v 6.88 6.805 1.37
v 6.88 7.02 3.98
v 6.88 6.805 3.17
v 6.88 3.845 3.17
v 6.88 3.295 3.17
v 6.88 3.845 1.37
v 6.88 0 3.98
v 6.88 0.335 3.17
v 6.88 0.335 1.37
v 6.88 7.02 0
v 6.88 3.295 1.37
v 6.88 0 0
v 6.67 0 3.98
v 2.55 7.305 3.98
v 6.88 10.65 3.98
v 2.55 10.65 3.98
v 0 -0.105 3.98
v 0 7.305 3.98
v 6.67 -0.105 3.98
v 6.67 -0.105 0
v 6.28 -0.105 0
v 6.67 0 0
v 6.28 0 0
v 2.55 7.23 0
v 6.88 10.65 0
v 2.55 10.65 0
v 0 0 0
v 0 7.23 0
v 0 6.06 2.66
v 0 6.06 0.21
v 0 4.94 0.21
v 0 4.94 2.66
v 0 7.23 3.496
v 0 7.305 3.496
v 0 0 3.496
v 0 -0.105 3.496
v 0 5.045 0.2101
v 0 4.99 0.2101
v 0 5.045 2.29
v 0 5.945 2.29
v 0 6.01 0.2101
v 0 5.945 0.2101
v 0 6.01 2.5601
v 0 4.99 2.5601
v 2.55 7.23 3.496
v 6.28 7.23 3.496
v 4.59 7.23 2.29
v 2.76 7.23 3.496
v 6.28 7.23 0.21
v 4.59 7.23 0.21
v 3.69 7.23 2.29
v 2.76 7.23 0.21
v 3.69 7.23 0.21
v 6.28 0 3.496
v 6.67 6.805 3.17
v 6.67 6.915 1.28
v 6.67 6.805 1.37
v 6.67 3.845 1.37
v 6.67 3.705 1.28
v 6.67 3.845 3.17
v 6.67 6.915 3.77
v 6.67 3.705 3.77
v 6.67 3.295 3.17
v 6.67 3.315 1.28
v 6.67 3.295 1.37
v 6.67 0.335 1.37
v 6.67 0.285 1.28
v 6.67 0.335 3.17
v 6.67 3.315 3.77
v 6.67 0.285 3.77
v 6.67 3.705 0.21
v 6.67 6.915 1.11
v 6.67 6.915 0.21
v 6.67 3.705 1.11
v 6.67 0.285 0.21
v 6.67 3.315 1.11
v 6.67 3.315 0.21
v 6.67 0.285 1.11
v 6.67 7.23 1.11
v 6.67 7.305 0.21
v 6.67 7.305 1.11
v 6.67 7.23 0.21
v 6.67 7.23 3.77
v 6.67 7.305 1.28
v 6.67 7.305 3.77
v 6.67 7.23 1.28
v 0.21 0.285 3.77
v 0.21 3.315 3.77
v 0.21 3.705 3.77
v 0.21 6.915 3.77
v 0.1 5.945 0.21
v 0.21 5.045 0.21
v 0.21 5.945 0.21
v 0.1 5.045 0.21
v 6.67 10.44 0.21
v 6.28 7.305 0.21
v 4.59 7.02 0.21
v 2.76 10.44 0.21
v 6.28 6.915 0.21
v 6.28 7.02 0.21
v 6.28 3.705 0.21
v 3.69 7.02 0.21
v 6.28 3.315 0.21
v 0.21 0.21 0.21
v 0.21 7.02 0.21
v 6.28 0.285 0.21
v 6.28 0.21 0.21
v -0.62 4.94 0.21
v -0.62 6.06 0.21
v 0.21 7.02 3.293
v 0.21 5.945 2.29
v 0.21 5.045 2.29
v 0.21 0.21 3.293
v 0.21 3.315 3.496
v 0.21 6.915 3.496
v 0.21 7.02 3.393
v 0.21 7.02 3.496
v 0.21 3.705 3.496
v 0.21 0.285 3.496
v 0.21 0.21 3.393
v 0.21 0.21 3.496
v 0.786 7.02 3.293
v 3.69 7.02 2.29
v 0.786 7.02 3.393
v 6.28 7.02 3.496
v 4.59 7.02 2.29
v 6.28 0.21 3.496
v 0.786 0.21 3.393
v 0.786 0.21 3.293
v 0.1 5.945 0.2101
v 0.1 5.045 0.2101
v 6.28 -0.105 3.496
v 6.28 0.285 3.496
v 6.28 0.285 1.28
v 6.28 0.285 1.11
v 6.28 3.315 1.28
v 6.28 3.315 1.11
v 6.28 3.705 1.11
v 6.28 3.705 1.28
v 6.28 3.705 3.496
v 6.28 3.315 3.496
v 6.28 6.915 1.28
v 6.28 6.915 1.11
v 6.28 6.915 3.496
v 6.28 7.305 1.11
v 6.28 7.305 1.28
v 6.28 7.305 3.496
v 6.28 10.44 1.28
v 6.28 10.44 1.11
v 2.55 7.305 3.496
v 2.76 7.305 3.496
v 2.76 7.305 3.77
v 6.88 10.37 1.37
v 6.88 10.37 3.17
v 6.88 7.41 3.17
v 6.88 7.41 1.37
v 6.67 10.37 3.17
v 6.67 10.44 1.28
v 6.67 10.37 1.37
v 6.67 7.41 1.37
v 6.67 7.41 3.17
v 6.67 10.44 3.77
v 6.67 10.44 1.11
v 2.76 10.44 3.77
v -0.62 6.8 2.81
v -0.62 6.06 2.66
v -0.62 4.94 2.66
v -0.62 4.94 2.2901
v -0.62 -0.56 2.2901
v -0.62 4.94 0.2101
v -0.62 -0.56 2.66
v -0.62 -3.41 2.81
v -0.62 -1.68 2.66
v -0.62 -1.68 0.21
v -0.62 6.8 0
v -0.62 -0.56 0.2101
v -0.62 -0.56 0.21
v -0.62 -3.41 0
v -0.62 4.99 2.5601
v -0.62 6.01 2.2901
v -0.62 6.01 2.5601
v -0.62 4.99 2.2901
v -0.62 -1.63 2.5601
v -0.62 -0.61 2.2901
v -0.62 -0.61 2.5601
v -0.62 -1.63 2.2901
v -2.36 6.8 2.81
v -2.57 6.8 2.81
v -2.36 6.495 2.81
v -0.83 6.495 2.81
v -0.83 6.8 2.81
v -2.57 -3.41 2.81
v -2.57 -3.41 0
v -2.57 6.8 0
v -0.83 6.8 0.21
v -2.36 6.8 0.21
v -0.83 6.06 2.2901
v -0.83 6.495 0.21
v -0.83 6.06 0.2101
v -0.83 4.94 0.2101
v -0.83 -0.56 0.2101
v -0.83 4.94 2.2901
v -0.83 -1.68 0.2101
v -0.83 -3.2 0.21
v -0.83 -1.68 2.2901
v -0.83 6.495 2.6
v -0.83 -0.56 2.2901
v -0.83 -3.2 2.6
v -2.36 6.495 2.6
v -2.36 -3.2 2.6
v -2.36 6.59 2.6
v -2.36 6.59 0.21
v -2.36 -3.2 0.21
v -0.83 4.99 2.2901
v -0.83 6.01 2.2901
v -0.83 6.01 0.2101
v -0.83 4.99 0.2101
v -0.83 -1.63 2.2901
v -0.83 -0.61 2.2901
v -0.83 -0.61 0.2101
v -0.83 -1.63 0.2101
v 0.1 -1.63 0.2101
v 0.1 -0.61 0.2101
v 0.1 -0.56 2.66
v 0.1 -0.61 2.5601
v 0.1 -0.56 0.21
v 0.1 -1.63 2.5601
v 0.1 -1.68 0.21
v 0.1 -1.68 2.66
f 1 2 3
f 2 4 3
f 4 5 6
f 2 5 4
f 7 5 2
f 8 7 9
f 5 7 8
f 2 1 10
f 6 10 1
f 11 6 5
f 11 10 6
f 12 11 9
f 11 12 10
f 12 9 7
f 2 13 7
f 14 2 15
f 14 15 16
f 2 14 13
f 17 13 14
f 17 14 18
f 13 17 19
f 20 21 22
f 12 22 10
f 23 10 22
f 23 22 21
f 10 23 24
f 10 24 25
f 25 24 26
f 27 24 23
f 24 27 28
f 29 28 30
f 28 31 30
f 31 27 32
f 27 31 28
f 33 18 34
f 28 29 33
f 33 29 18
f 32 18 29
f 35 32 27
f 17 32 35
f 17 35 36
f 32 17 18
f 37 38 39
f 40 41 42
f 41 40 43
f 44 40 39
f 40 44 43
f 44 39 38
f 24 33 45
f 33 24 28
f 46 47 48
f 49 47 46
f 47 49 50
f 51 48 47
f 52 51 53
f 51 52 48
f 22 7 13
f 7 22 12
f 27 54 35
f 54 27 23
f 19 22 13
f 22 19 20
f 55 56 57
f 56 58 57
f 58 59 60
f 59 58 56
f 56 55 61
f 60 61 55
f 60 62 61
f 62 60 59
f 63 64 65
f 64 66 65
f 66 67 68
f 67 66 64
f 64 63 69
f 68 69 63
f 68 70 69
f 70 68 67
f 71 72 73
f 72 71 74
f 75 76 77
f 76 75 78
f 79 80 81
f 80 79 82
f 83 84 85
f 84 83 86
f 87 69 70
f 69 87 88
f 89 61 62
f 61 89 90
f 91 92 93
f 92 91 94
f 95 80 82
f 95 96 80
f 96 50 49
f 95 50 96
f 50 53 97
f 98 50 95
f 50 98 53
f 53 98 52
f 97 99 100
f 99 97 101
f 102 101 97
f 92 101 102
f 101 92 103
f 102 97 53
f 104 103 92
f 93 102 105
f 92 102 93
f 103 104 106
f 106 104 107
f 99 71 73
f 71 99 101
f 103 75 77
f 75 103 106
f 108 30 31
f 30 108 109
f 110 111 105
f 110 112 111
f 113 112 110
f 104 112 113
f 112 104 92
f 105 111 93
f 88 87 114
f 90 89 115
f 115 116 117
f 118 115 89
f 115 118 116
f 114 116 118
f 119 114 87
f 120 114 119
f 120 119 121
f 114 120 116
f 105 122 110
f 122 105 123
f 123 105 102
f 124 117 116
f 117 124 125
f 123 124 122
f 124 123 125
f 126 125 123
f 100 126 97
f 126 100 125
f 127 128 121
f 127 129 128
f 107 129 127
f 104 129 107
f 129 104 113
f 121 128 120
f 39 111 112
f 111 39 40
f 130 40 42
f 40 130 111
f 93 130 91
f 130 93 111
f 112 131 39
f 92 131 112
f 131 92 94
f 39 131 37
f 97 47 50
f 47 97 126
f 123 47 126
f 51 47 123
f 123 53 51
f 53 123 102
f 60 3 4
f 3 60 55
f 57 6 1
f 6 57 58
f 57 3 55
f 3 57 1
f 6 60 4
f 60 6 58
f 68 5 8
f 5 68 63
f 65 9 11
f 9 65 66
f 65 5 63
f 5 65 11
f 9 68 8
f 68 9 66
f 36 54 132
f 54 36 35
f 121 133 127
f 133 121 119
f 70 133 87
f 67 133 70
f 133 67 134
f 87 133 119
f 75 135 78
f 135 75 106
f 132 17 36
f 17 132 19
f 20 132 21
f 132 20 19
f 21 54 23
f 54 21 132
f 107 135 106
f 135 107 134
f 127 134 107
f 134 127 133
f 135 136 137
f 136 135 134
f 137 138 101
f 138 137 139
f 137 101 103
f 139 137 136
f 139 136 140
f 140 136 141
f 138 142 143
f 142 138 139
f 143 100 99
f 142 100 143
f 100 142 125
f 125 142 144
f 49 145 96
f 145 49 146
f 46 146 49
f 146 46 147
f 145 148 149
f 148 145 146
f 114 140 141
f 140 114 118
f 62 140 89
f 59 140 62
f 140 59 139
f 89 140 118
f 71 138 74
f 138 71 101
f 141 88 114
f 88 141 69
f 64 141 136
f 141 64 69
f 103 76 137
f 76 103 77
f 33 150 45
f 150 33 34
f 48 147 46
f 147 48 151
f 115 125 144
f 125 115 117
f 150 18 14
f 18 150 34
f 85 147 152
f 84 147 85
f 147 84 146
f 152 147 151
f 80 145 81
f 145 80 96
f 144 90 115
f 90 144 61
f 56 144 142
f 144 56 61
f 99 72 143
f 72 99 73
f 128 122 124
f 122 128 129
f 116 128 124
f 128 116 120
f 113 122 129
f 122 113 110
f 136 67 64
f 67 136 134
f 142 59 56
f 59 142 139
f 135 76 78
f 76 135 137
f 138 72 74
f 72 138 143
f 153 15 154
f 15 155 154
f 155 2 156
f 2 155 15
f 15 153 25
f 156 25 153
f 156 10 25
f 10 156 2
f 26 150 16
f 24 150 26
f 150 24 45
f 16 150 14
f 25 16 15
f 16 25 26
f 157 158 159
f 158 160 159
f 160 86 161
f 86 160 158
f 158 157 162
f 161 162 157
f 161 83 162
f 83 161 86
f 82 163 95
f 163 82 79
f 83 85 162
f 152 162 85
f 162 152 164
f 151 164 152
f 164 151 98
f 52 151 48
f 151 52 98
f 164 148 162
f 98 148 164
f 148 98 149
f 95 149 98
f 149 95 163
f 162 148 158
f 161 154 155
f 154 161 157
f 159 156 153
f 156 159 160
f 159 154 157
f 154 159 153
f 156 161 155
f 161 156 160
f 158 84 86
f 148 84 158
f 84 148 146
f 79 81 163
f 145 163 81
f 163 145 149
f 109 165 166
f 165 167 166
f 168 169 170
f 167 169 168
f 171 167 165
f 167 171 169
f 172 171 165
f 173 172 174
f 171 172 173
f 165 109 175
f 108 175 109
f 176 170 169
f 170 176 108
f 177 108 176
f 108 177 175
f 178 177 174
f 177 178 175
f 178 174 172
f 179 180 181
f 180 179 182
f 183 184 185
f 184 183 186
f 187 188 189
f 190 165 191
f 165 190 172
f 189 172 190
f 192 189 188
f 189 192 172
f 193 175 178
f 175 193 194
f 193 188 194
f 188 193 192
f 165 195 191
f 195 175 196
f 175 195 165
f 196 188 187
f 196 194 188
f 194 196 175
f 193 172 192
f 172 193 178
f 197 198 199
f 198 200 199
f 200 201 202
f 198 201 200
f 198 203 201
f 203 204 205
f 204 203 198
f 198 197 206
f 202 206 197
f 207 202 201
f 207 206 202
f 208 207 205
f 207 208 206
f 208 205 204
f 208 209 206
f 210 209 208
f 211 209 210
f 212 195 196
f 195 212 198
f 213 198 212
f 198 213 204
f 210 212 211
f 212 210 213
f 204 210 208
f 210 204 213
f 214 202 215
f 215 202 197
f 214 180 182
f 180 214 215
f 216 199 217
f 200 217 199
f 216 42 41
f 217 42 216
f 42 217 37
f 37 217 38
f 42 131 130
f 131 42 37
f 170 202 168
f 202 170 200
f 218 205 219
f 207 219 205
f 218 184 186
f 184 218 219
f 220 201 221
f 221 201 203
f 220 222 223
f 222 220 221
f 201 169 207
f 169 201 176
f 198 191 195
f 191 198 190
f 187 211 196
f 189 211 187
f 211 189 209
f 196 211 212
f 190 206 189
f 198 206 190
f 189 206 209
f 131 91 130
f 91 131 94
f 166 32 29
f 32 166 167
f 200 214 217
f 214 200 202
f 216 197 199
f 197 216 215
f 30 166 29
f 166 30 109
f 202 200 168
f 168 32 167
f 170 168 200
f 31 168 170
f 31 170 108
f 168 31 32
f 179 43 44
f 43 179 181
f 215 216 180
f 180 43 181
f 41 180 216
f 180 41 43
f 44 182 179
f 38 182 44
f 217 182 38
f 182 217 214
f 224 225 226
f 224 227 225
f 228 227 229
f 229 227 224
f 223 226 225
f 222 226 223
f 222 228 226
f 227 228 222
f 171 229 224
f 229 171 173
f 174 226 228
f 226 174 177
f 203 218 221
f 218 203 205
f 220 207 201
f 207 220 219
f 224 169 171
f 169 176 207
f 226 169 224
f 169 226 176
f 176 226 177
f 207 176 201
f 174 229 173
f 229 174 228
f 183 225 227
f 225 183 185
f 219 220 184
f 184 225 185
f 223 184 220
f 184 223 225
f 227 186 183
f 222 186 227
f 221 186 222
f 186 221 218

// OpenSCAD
//$fn=100;
//include <MCAD\regular_shapes.scad>

					/////PARAMETERS\\\\\

//VISIBLE ROOMS AND OBJECTS:
ceilings = true;
doors = true;
v315 = true;
v317 = true;
v314 = false;
serverRoom = false;
hallway = true;
windowsill = true;
windows = true;

//GENERAL
wall_t = 0.21; 
ceiling_h = 3.77;
room_x_def = 6.67;
door_y = 0.9;
door_z = 2.08;

//V315
v315_x = room_x_def;
v315_y = 7.02;
v315_z = ceiling_h;
v315_dist_2_door = 0.96;

//V317
v317_x = 4.12;
v317_y = 3.42;
v317_z = ceiling_h;
v317_dist_2_door = 0.93;


//HALLWAY CONNECTION
con_x = 0.83;
con_y = 1.12;
con_z = 2.45;

//HALLWAY
hal_x = 1.74;
hal_y = 10;
hal_z = 2.60;

//V314
v314_x = room_x_def;
v314_y = 3.41;
v314_z = ceiling_h;
v314_dist_2_door_hallway = 1.52;
v314_dist_2_door_server = 0.25;

//SERVER ROOM
serv_x = room_x_def;
serv_y = 3.41;
serv_z = ceiling_h;

//BEAMS
beam_x = v315_x;
beam_y = 0.39;
beam_z = 0.484;

//WINDOWSILL
windowsill_x = beam_y+0.06;
windowsill_h = 1.11;
windowsill_z = 0.17;

//WINDOW
window_z = 1.8;
window_y = 2.96;
window_x = 0.5;
window_h = windowsill_h + windowsill_z + 0.09;

//CABLE TRACK
track_x = 0.786;
track_y = v315_y+v314_y+serv_y;
track_z = 0.1;
track_h = 3.193;

					 /////MODEL\\\\
if(v315)	v315();
if(v317)	v317();
if(v314)	v314();
if(serverRoom)	serverRoom();
if(hallway) hallway();


					/////MODULES\\\\\

module room(x,y,z){
	difference(){
    	cube([x+wall_t,y+wall_t,z+wall_t]);
			if(ceilings){
				translate([wall_t,wall_t,wall_t]) cube([x-wall_t,y-wall_t,z-wall_t]);
			}
			else{
				translate([wall_t,wall_t,wall_t]) cube([x-wall_t,y-wall_t,z+wall_t]);
			}
    	
	}
}

module connection(x,y,z){
	difference(){
    	translate([0,0,wall_t])cube([x,y,z]);
    	translate([-0.25,0.05,wall_t+0.0001])cube([x+0.5,y-0.1,z-0.1]);
	}
}

module beamCorner(){
	translate([0,0,ceiling_h-beam_z+wall_t])cube([beam_x,beam_y,beam_z]);
	translate([room_x_def-beam_y,0,0])cube([beam_y,beam_y,ceiling_h]);
}

module windowsill(y){
		translate([v315_x-beam_y,0,windowsill_h])cube([windowsill_x,y,windowsill_z]);
}

module window(y){
	translate([v315_x - wall_t/2,0,window_h])cube([window_x,y,window_z]);
}

module cableTrack(y){
	translate([0,0,track_h+track_z])cube([track_x,y,track_z]);
}

module v315(){
	difference(){
	    	room(v315_x,v315_y,v315_z);
			if(doors){
				//DOOR 2 HALLWAY
				translate([-wall_t/2,v315_y+wall_t/2-con_y-v315_dist_2_door,wall_t])cube([wall_t*2,door_y,door_z]);
				//DOOR 2 V317
				translate([v315_x-v317_x+v317_dist_2_door+wall_t,v315_y-wall_t/2,wall_t])cube([door_y,wall_t*2,door_z]);
			}

			if(windows){
				translate([0,v315_y/2+beam_y/2+0.14,0])window(window_y);
				translate([0,beam_y/2+0.14,0])window(window_y);
			}
	}
	cableTrack(v315_y);

	translate([0,-wall_t/2,0])beamCorner();
	translate([0,v315_y/2-beam_y/2,0]) beamCorner();
	translate([0,v315_y-wall_t/2,0])beamCorner();

	if(windowsill){
   		windowsill(v315_y);
	}
}

module v317(){
	difference(){
	   translate([v315_x-v317_x,v315_y,0])room(v317_x,v317_y,v317_z);
		if(doors){
			//DOOR 2 V315
			translate([v315_x-v317_x+v317_dist_2_door+wall_t,v315_y-wall_t/2,wall_t])cube([door_y,wall_t*2,door_z]);
		}

		if(windows){
			translate([0,v315_y+beam_y,0])window(window_y);
		}
	}
	if(windowsill){
		translate([0,v315_y,0])windowsill(v317_y);
	}

	
}

module v314(){
	difference(){
	   translate([0,-v315_y+v314_y+wall_t,0])room(v314_x,v314_y,v314_z);
		if(doors){
			//DOOR 2 HALLWAY
			translate([-wall_t/2,-v314_y+v314_dist_2_door_hallway+wall_t*1.5,wall_t+0.0001])cube([wall_t*2,door_y,door_z]);
			//DOOR 2 SERVER ROOM
			translate([v314_dist_2_door_server+wall_t,-v314_y-wall_t/2,wall_t])cube([door_y,wall_t*2,door_z]);
		}

		if(windows){
			translate([0,-v314_y+beam_y,0])window(window_y-0.1);
		}
	}

	translate([0,-v314_y,0])cableTrack(v314_y);
	
	translate([0,-wall_t/2,0])beamCorner();
	translate([0,-v314_y-wall_t/2,0])beamCorner();
	
	if(windowsill){
		translate([0,-v314_y,0])windowsill(v314_y);
	}
}

module serverRoom(){
	difference(){
	translate([0,-(v315_y+v314_y)+serv_y+wall_t,0])room(serv_x,serv_y,serv_z);
		if(doors){
			//DOOR 2 V314
			translate([v314_dist_2_door_server+wall_t,-v314_y-wall_t/2,wall_t])cube([door_y,wall_t*2,door_z]);
		}

		if(windows){
			translate([0,-v314_y-serv_y+beam_y,0])window(window_y-0.1);
		}
	}
	translate([0,-v314_y-serv_y,0])cableTrack(v314_y);

	translate([0,-v314_y-wall_t/2,0])beamCorner();
	translate([0,-v314_y*2,0])beamCorner();

	if(windowsill){
		translate([0,-v314_y-serv_y,0])windowsill(v314_y);
	}
}

module hallway(){
	difference(){
		translate([-(hal_x+con_x),-v314_y,0])room(hal_x,hal_y,hal_z);
		translate([-(hal_x+con_x)+wall_t,v315_y-wall_t*2.5,wall_t])cube([hal_x-wall_t,wall_t*2,hal_z+wall_t]);

		if(doors){
			//DOOR V315
			translate([-con_x-wall_t/2,v315_y-con_y-v315_dist_2_door,wall_t+0.0001])cube([wall_t*2,con_y,door_z]);

			//DOOR V314
			translate([-con_x-wall_t/2,-v314_y+wall_t+v314_dist_2_door_hallway,wall_t+0.0001])cube([wall_t*2,con_y,door_z]);
		}
	}

	//HALLWAY CONNECTIONS
	//HALLWAY CONNECTION V315
	translate([-con_x,v315_y-con_y-v315_dist_2_door,0])connection(con_x+0.1,con_y,con_z);

	//HALLWAY CONNECTION V314
	translate([-con_x,-v314_y+wall_t+v314_dist_2_door_hallway,0])connection(con_x+0.1,con_y,con_z);
}
